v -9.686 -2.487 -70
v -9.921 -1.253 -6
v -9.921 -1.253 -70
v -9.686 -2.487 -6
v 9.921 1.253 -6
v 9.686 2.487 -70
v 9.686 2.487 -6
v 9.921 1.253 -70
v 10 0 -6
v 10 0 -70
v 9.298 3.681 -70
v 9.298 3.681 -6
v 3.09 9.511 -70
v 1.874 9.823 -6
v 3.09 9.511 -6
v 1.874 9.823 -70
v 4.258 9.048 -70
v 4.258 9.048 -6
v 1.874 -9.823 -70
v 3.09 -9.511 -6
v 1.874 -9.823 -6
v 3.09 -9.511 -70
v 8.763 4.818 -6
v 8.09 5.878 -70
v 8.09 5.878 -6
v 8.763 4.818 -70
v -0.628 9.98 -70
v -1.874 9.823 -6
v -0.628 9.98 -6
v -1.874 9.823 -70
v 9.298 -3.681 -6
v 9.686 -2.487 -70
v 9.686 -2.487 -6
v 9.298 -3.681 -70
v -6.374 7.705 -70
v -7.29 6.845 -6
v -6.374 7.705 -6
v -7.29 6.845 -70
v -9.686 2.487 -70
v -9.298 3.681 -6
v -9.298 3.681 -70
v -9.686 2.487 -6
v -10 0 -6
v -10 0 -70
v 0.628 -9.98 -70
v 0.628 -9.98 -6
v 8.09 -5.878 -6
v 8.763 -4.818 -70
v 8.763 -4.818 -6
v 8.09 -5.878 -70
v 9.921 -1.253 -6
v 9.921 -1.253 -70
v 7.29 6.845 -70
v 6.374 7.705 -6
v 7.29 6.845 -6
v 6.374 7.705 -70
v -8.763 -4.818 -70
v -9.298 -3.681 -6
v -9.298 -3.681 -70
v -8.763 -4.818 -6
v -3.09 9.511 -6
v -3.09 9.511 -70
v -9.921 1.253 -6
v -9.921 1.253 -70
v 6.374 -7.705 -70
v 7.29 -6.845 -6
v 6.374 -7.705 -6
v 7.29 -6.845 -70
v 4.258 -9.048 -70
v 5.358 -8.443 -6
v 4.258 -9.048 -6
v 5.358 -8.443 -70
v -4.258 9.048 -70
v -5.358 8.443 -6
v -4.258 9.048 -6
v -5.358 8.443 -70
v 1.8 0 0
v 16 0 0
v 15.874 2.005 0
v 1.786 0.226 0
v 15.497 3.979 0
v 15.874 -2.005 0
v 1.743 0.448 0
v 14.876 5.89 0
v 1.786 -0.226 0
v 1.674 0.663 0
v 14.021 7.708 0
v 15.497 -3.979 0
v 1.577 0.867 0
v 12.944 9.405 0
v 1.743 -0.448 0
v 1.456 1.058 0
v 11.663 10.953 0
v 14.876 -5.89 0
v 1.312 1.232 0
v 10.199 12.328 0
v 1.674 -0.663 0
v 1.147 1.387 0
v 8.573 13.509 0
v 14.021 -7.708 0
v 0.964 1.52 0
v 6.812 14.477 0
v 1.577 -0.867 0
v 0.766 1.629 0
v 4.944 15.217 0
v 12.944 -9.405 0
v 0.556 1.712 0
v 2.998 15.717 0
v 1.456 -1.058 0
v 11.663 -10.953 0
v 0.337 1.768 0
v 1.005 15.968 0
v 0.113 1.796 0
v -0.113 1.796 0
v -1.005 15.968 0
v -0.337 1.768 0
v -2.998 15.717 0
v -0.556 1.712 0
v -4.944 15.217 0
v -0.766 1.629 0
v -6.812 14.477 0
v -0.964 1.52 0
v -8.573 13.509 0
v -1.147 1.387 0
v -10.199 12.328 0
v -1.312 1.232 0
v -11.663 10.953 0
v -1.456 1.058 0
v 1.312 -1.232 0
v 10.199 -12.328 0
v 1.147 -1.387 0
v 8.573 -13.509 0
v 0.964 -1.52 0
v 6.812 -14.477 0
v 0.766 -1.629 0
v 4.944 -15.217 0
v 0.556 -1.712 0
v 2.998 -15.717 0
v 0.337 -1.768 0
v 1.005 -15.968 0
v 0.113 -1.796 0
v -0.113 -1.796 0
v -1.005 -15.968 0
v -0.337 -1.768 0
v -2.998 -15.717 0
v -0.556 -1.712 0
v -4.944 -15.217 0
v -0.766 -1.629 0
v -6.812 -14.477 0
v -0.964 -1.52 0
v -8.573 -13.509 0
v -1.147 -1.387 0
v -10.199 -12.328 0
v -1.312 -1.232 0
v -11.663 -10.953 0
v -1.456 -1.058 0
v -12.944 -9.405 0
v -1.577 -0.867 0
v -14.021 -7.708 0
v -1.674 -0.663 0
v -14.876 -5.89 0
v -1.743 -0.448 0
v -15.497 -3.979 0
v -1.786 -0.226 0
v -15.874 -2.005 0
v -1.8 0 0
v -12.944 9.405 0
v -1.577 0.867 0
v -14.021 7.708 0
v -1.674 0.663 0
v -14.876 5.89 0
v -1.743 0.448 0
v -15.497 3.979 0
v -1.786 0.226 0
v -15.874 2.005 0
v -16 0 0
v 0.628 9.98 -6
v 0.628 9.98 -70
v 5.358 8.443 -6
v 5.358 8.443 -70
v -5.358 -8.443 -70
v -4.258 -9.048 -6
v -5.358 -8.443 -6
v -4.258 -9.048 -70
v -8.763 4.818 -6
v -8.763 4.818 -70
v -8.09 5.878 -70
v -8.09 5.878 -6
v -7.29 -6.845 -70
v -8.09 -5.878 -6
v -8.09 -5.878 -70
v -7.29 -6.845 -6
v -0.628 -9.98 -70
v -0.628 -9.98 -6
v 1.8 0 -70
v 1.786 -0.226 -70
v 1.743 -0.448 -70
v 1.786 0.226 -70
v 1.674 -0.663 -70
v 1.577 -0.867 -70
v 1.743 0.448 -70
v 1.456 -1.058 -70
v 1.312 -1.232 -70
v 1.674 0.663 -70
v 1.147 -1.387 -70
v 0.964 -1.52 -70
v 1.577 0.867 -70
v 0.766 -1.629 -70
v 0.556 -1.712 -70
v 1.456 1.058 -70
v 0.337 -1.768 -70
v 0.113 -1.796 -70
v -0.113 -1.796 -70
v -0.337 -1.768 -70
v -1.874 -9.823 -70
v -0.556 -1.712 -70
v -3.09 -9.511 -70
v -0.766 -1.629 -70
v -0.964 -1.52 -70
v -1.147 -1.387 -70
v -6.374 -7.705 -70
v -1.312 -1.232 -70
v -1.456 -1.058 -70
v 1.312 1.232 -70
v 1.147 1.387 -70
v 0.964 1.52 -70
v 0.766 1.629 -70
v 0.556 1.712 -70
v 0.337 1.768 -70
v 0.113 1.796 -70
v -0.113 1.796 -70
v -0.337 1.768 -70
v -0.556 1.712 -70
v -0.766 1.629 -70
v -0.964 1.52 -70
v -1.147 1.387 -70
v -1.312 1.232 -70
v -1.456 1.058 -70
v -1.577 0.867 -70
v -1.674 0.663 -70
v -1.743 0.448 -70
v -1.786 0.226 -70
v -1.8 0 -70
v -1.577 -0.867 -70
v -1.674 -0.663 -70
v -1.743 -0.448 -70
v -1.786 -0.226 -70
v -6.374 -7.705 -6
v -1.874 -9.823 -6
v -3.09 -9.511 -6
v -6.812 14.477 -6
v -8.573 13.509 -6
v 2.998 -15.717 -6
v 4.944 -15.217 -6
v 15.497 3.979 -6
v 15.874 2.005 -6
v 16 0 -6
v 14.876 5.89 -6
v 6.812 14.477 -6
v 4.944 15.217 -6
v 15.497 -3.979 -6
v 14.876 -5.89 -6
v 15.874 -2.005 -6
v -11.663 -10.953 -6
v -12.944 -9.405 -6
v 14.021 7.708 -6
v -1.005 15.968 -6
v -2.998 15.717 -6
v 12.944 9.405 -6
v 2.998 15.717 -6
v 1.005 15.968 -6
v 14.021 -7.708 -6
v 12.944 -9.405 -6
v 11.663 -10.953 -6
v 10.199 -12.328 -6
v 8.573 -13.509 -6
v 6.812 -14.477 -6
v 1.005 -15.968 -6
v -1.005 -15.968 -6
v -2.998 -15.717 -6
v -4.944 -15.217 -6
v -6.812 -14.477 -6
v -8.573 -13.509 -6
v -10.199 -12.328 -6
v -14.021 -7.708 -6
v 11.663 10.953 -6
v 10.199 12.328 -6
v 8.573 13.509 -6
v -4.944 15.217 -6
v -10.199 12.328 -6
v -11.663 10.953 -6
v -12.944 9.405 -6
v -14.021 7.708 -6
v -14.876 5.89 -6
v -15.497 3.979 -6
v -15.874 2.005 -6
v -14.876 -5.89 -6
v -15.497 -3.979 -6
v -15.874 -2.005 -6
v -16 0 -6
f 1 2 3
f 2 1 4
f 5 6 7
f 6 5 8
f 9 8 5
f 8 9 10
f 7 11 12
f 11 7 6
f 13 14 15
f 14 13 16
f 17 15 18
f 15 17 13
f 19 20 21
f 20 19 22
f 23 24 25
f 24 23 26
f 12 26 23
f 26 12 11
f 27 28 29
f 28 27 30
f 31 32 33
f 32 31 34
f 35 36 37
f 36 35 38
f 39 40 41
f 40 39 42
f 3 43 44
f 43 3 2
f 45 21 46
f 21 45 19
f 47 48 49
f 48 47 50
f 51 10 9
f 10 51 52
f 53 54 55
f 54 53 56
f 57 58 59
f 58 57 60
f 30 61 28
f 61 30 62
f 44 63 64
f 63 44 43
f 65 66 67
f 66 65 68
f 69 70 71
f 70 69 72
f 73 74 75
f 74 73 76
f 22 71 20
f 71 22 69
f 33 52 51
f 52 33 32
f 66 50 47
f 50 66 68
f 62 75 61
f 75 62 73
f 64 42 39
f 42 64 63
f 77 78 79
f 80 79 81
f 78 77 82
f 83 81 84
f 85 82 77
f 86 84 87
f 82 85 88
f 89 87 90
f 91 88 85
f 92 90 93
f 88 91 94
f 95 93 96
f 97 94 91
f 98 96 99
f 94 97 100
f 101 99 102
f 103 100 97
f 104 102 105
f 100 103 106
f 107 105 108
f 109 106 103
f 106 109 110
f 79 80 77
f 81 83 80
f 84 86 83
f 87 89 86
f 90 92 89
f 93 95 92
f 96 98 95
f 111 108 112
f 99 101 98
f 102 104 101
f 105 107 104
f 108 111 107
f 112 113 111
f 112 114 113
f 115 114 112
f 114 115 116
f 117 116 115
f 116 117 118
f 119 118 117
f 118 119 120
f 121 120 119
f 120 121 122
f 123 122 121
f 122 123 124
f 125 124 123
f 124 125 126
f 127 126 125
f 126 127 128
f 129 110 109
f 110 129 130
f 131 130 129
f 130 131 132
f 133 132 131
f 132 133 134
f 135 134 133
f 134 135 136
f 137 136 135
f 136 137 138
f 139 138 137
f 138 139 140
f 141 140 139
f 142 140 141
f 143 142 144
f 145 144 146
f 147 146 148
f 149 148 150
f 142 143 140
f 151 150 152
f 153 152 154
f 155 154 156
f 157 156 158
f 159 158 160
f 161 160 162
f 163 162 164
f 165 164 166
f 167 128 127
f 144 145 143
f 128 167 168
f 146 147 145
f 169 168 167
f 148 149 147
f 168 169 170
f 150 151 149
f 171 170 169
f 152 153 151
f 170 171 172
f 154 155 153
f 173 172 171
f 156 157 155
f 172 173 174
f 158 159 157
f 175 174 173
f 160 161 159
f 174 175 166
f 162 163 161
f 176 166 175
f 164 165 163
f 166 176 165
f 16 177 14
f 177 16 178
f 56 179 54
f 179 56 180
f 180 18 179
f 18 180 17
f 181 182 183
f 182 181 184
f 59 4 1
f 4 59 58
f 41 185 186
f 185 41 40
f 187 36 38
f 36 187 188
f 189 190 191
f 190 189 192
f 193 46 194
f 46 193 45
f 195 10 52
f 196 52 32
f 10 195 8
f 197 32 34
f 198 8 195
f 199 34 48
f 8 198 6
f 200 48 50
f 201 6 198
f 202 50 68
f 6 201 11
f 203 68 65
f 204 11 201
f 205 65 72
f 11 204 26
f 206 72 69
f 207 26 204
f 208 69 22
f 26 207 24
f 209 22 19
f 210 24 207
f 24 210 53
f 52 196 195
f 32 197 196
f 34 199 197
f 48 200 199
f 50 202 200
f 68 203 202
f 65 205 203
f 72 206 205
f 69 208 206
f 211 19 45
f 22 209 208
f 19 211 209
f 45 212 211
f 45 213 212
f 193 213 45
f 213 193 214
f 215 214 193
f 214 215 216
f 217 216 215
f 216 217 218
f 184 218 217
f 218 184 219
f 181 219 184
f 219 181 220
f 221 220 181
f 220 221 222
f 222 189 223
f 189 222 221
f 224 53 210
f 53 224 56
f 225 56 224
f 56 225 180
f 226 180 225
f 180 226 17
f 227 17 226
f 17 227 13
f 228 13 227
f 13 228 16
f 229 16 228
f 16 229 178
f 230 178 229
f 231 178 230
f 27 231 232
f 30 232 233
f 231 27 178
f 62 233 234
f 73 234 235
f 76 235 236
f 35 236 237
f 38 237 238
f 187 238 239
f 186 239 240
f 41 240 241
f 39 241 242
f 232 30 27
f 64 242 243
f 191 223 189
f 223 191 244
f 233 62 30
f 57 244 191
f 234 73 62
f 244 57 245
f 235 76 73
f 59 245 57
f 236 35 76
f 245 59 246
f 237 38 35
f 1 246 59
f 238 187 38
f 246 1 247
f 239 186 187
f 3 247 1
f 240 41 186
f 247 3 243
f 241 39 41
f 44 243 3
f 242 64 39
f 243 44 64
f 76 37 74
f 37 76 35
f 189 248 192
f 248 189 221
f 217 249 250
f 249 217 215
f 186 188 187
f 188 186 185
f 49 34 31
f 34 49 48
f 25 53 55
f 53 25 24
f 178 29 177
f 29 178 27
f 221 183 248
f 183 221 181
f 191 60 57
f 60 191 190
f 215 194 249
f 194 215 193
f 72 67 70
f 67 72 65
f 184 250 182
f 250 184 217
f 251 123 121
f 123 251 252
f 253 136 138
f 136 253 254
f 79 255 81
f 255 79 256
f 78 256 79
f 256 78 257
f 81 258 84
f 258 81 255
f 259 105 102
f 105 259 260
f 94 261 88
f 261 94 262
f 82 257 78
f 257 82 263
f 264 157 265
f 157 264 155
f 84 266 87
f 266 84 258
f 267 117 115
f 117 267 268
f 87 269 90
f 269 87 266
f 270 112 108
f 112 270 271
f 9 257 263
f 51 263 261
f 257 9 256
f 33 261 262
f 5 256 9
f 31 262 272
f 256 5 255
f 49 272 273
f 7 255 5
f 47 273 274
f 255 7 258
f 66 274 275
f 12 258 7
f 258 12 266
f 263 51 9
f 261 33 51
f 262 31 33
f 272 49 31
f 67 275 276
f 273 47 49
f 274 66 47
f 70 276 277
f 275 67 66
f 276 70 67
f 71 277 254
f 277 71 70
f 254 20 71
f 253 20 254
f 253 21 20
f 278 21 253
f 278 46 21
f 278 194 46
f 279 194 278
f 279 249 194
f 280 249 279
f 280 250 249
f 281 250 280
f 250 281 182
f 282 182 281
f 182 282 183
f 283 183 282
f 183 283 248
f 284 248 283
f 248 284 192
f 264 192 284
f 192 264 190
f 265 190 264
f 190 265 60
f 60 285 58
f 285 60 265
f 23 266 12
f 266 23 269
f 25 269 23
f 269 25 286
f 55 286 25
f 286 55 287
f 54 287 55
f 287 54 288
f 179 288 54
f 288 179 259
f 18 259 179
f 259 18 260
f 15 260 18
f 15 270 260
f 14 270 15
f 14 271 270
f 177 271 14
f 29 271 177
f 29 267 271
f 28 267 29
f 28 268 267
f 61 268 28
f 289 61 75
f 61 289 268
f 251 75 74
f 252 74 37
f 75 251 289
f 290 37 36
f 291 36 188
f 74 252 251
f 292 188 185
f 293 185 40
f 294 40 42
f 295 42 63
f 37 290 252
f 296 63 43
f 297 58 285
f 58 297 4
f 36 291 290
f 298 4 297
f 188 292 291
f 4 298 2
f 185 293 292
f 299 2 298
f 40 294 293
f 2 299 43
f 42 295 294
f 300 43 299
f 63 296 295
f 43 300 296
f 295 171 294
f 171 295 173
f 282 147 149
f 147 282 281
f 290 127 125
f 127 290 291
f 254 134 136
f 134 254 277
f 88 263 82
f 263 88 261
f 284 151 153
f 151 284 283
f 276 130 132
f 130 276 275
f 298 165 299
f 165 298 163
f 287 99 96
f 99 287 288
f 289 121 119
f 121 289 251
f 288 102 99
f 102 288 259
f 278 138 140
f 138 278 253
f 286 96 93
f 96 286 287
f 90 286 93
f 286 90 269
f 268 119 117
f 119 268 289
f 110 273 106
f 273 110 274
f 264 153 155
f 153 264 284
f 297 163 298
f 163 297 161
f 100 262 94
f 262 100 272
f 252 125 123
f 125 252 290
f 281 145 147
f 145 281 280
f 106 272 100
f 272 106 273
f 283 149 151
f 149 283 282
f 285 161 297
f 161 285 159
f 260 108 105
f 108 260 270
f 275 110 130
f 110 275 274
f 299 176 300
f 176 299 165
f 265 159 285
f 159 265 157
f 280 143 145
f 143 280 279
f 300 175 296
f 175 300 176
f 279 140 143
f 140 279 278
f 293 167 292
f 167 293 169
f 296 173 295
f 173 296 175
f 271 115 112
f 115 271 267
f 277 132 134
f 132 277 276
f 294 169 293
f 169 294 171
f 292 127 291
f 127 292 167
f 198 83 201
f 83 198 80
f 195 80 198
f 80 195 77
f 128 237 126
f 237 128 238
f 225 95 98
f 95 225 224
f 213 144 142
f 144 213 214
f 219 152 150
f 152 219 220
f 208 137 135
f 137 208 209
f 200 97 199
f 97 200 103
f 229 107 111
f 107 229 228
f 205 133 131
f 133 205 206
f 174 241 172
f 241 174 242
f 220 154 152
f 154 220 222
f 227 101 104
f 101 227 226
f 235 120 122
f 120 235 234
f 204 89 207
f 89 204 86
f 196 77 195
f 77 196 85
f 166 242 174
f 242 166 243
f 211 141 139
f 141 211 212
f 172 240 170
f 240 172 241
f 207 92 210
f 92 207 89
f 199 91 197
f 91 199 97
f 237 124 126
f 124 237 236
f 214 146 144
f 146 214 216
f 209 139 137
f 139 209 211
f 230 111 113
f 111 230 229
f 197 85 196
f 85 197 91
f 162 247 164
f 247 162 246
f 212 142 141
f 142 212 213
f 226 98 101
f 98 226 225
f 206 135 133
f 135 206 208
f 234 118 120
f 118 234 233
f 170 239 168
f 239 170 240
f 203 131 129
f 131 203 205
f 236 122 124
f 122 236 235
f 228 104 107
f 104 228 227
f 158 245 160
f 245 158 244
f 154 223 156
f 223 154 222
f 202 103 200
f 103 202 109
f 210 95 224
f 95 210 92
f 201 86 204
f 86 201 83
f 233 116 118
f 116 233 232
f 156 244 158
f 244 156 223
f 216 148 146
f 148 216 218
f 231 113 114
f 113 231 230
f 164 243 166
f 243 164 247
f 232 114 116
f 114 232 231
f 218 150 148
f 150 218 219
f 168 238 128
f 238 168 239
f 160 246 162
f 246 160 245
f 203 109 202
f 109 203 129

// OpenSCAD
$fn = 50;


difference() {
	union() {
		translate(v = [0, 0, -70.0000000000]) {
			cylinder(h = 70, r = 10.0000000000);
		}
		translate(v = [0, 0, -6.0000000000]) {
			cylinder(h = 6, r = 16.0000000000);
		}
	}
	union() {
		#translate(v = [0, 0, -70]) {
			cylinder(h = 70, r = 1.8000000000);
		}
	}
}
